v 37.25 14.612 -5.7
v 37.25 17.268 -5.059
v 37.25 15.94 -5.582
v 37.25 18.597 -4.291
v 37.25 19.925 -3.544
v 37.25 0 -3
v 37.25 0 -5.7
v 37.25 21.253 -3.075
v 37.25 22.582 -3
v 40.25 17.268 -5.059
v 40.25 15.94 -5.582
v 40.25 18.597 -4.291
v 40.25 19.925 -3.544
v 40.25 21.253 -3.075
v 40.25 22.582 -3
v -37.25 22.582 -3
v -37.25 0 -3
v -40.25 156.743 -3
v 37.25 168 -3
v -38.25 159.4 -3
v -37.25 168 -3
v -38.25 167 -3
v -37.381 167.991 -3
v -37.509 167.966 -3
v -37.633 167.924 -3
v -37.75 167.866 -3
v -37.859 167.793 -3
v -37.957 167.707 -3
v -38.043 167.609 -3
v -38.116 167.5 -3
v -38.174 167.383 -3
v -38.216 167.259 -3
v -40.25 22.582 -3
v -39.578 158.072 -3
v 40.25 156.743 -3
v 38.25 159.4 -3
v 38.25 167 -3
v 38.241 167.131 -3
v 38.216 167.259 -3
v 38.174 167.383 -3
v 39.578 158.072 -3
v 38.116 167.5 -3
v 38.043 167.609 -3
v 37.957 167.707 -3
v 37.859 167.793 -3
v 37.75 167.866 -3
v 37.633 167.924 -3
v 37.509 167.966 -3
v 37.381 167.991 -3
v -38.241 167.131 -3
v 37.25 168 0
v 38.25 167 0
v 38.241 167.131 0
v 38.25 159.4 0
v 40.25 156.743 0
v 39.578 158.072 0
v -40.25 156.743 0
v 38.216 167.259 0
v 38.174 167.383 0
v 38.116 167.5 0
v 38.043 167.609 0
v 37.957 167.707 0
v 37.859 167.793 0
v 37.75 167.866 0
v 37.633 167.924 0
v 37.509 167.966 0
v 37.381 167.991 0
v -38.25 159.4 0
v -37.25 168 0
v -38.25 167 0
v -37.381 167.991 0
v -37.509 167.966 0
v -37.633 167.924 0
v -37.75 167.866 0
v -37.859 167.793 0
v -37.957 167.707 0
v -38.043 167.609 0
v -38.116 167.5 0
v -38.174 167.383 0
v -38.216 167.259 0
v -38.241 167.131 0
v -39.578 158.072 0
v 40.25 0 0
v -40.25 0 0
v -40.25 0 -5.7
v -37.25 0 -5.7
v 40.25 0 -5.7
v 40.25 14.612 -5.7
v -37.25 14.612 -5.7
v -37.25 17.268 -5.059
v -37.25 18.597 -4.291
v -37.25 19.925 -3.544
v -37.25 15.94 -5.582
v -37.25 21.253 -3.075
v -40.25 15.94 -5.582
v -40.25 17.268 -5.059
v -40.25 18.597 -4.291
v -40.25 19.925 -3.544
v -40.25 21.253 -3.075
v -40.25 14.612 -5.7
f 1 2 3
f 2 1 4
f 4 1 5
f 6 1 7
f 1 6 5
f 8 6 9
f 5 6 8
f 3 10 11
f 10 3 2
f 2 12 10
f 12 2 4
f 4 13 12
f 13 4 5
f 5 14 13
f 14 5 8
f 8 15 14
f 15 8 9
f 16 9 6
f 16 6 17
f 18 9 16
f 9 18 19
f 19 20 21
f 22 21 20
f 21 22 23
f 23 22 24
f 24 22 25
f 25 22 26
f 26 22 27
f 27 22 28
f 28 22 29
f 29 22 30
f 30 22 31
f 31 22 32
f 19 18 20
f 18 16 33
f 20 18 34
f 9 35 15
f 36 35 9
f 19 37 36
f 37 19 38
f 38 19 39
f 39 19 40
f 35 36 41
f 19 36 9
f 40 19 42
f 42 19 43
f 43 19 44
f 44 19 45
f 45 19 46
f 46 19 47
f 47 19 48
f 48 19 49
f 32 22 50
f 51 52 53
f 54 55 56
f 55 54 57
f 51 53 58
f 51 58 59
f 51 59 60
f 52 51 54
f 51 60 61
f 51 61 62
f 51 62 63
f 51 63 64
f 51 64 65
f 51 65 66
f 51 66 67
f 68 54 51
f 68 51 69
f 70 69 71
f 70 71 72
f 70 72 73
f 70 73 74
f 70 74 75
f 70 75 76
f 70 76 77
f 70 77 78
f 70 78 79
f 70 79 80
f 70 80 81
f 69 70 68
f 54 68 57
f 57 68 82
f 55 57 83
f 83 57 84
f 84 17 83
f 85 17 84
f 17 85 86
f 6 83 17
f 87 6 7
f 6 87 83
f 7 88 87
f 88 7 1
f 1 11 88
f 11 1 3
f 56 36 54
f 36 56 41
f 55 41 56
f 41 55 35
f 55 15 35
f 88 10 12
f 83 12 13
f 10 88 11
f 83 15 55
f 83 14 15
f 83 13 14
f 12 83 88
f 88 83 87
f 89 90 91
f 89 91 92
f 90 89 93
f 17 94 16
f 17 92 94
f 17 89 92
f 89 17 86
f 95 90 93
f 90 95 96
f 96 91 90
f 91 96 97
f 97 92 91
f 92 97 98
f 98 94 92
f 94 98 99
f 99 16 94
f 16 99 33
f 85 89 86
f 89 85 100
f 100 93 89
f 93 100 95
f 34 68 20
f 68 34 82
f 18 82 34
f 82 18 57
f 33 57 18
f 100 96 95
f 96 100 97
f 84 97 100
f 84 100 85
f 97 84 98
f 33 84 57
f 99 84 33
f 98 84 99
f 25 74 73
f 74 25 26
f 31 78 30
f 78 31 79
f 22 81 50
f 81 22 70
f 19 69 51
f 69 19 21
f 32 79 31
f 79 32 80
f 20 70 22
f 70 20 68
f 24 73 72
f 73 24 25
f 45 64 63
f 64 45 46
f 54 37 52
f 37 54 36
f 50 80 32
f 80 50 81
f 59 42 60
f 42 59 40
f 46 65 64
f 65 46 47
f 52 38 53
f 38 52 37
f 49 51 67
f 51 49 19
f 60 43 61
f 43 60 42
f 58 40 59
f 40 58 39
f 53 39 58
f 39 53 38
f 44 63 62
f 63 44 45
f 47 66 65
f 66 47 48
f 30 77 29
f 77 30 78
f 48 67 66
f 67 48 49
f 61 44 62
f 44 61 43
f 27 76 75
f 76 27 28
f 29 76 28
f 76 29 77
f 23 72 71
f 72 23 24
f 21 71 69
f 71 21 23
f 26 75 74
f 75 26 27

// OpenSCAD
// A plate for the Makera Carvera's dust-bin bay (2026-11-02): it replaces the
// clear dust bin with a flat plate on the bin's side ridges, so it slides into
// the bay and locks the way the bin does. A Raspberry Pi case gets bolted
// upside down under it (holes drilled to suit the case; the case comes later).
//
// Rev 2 (after the first print): one 3 thick slab, 80.5 across, its outer 2
// on each side being the ridges. At the front (handle) end the ridges hang
// down to 5.7 through a short S-curve: pushed home, that lifts the bin up
// against the machine's filter duct. At the back (the end that goes in
// first) the ridges stop 8.6 short of the edge, with a short lead-in.
//
// Measured by the user (calipers, 2026-11-02): 80.5 across the ridges, 168
// front to back without the handle, ridges 2 out, ridges start 8.6 in from
// the back. On the bin the ridge is 1.5 thick with its top 2.9 below the
// bin's top; he chose a plain 3 slab here instead. 5.7 at the front: his
// pick (the bin measured 5.2). Guessed: the 15 thick length, the 7 S-curve,
// the 2 lead-in.
//
// Datum: the plate's top face at z = 0 (the plate below it), centred in x;
// y = 0 at the front (handle) edge, the back edge at y = len.

/* [Show] */
// "plate" (as it sits in the machine) or "print" (top face down on the bed)
part = "plate";
$fn = 48;

/* [Bin, measured] */
rail_w_total = 80.5;   // across the ridges
len = 168;             // front to back, without the handle
rail_out = 2;          // ridge past each side of the body
rail_setback = 8.6;    // ridges stop this far short of the back edge
rail_t_front = 5.7;    // ridge depth at the front end (the user's pick)

/* [Bin, guessed] */
rail_thick_l = 15;     // full front depth from the front edge for this long
rail_curve_l = 7;      // S-curve from rail_t_front up to plate_t over this length
rail_lead_l = 2;       // the ridge grows from nothing to rail_out over this length

/* [Plate] */
plate_t = 3;           // the whole slab, ridges included
corner_r = 1;          // plate corners, in plan

body_w = rail_w_total - 2 * rail_out;   // 76.5
rail_end = len - rail_setback;          // the ridges' back end, in y
eps = 0.01;

echo(body_w = body_w, rail_end = rail_end, rail_drop_below_plate_at_front = rail_t_front - plate_t);
assert(rail_t_front >= plate_t, "the front of the ridge must be at least the plate's depth");

// Ridge depth along y: rail_t_front at the front, an S (cosine) up to the plate.
function rail_th(y) =
    y <= rail_thick_l ? rail_t_front
  : y >= rail_thick_l + rail_curve_l ? plate_t
  : plate_t + (rail_t_front - plate_t) * (1 + cos(180 * (y - rail_thick_l) / rail_curve_l)) / 2;

// How far the ridge sticks out along y: full, then a short lead-in to nothing
// at its back end.
function rail_reach(y) =
    y <= rail_end - rail_lead_l ? rail_out
  : rail_out * (rail_end - y) / rail_lead_l;

module rail(side) {   // side = +1 / -1
    n = 120;
    ys = [for (i = [0:n]) rail_end * i / n];
    // side profile (y, z) extruded across the ridge, cut to its plan shape;
    // it starts 1 inside the body's side so the two fuse
    intersection() {
        translate([side > 0 ? body_w / 2 - 1 : -body_w / 2 - rail_out - eps, 0, 0])
            rotate([90, 0, 90]) linear_extrude(rail_out + 1 + eps)
                polygon(concat([for (y = ys) [y, 0]], [for (i = [n:-1:0]) [ys[i], -rail_th(ys[i])]]));
        linear_extrude(height = 2 * rail_t_front + 2, center = true)
            polygon(concat([for (y = ys) [side * (body_w / 2 - 1), y]],
                           [for (i = [n:-1:0]) [side * (body_w / 2 + rail_reach(ys[i])), ys[i]]]));
    }
}

module plate() {
    translate([0, 0, -plate_t]) linear_extrude(plate_t)
        hull() for (sx = [-1, 1], yy = [corner_r, len - corner_r])
            translate([sx * (body_w / 2 - corner_r), yy]) circle(r = corner_r);
    rail(1); rail(-1);
}

if (part == "plate") plate();
else if (part == "print") rotate([180, 0, 0]) plate();   // top face on the bed: the deep front ends build up
